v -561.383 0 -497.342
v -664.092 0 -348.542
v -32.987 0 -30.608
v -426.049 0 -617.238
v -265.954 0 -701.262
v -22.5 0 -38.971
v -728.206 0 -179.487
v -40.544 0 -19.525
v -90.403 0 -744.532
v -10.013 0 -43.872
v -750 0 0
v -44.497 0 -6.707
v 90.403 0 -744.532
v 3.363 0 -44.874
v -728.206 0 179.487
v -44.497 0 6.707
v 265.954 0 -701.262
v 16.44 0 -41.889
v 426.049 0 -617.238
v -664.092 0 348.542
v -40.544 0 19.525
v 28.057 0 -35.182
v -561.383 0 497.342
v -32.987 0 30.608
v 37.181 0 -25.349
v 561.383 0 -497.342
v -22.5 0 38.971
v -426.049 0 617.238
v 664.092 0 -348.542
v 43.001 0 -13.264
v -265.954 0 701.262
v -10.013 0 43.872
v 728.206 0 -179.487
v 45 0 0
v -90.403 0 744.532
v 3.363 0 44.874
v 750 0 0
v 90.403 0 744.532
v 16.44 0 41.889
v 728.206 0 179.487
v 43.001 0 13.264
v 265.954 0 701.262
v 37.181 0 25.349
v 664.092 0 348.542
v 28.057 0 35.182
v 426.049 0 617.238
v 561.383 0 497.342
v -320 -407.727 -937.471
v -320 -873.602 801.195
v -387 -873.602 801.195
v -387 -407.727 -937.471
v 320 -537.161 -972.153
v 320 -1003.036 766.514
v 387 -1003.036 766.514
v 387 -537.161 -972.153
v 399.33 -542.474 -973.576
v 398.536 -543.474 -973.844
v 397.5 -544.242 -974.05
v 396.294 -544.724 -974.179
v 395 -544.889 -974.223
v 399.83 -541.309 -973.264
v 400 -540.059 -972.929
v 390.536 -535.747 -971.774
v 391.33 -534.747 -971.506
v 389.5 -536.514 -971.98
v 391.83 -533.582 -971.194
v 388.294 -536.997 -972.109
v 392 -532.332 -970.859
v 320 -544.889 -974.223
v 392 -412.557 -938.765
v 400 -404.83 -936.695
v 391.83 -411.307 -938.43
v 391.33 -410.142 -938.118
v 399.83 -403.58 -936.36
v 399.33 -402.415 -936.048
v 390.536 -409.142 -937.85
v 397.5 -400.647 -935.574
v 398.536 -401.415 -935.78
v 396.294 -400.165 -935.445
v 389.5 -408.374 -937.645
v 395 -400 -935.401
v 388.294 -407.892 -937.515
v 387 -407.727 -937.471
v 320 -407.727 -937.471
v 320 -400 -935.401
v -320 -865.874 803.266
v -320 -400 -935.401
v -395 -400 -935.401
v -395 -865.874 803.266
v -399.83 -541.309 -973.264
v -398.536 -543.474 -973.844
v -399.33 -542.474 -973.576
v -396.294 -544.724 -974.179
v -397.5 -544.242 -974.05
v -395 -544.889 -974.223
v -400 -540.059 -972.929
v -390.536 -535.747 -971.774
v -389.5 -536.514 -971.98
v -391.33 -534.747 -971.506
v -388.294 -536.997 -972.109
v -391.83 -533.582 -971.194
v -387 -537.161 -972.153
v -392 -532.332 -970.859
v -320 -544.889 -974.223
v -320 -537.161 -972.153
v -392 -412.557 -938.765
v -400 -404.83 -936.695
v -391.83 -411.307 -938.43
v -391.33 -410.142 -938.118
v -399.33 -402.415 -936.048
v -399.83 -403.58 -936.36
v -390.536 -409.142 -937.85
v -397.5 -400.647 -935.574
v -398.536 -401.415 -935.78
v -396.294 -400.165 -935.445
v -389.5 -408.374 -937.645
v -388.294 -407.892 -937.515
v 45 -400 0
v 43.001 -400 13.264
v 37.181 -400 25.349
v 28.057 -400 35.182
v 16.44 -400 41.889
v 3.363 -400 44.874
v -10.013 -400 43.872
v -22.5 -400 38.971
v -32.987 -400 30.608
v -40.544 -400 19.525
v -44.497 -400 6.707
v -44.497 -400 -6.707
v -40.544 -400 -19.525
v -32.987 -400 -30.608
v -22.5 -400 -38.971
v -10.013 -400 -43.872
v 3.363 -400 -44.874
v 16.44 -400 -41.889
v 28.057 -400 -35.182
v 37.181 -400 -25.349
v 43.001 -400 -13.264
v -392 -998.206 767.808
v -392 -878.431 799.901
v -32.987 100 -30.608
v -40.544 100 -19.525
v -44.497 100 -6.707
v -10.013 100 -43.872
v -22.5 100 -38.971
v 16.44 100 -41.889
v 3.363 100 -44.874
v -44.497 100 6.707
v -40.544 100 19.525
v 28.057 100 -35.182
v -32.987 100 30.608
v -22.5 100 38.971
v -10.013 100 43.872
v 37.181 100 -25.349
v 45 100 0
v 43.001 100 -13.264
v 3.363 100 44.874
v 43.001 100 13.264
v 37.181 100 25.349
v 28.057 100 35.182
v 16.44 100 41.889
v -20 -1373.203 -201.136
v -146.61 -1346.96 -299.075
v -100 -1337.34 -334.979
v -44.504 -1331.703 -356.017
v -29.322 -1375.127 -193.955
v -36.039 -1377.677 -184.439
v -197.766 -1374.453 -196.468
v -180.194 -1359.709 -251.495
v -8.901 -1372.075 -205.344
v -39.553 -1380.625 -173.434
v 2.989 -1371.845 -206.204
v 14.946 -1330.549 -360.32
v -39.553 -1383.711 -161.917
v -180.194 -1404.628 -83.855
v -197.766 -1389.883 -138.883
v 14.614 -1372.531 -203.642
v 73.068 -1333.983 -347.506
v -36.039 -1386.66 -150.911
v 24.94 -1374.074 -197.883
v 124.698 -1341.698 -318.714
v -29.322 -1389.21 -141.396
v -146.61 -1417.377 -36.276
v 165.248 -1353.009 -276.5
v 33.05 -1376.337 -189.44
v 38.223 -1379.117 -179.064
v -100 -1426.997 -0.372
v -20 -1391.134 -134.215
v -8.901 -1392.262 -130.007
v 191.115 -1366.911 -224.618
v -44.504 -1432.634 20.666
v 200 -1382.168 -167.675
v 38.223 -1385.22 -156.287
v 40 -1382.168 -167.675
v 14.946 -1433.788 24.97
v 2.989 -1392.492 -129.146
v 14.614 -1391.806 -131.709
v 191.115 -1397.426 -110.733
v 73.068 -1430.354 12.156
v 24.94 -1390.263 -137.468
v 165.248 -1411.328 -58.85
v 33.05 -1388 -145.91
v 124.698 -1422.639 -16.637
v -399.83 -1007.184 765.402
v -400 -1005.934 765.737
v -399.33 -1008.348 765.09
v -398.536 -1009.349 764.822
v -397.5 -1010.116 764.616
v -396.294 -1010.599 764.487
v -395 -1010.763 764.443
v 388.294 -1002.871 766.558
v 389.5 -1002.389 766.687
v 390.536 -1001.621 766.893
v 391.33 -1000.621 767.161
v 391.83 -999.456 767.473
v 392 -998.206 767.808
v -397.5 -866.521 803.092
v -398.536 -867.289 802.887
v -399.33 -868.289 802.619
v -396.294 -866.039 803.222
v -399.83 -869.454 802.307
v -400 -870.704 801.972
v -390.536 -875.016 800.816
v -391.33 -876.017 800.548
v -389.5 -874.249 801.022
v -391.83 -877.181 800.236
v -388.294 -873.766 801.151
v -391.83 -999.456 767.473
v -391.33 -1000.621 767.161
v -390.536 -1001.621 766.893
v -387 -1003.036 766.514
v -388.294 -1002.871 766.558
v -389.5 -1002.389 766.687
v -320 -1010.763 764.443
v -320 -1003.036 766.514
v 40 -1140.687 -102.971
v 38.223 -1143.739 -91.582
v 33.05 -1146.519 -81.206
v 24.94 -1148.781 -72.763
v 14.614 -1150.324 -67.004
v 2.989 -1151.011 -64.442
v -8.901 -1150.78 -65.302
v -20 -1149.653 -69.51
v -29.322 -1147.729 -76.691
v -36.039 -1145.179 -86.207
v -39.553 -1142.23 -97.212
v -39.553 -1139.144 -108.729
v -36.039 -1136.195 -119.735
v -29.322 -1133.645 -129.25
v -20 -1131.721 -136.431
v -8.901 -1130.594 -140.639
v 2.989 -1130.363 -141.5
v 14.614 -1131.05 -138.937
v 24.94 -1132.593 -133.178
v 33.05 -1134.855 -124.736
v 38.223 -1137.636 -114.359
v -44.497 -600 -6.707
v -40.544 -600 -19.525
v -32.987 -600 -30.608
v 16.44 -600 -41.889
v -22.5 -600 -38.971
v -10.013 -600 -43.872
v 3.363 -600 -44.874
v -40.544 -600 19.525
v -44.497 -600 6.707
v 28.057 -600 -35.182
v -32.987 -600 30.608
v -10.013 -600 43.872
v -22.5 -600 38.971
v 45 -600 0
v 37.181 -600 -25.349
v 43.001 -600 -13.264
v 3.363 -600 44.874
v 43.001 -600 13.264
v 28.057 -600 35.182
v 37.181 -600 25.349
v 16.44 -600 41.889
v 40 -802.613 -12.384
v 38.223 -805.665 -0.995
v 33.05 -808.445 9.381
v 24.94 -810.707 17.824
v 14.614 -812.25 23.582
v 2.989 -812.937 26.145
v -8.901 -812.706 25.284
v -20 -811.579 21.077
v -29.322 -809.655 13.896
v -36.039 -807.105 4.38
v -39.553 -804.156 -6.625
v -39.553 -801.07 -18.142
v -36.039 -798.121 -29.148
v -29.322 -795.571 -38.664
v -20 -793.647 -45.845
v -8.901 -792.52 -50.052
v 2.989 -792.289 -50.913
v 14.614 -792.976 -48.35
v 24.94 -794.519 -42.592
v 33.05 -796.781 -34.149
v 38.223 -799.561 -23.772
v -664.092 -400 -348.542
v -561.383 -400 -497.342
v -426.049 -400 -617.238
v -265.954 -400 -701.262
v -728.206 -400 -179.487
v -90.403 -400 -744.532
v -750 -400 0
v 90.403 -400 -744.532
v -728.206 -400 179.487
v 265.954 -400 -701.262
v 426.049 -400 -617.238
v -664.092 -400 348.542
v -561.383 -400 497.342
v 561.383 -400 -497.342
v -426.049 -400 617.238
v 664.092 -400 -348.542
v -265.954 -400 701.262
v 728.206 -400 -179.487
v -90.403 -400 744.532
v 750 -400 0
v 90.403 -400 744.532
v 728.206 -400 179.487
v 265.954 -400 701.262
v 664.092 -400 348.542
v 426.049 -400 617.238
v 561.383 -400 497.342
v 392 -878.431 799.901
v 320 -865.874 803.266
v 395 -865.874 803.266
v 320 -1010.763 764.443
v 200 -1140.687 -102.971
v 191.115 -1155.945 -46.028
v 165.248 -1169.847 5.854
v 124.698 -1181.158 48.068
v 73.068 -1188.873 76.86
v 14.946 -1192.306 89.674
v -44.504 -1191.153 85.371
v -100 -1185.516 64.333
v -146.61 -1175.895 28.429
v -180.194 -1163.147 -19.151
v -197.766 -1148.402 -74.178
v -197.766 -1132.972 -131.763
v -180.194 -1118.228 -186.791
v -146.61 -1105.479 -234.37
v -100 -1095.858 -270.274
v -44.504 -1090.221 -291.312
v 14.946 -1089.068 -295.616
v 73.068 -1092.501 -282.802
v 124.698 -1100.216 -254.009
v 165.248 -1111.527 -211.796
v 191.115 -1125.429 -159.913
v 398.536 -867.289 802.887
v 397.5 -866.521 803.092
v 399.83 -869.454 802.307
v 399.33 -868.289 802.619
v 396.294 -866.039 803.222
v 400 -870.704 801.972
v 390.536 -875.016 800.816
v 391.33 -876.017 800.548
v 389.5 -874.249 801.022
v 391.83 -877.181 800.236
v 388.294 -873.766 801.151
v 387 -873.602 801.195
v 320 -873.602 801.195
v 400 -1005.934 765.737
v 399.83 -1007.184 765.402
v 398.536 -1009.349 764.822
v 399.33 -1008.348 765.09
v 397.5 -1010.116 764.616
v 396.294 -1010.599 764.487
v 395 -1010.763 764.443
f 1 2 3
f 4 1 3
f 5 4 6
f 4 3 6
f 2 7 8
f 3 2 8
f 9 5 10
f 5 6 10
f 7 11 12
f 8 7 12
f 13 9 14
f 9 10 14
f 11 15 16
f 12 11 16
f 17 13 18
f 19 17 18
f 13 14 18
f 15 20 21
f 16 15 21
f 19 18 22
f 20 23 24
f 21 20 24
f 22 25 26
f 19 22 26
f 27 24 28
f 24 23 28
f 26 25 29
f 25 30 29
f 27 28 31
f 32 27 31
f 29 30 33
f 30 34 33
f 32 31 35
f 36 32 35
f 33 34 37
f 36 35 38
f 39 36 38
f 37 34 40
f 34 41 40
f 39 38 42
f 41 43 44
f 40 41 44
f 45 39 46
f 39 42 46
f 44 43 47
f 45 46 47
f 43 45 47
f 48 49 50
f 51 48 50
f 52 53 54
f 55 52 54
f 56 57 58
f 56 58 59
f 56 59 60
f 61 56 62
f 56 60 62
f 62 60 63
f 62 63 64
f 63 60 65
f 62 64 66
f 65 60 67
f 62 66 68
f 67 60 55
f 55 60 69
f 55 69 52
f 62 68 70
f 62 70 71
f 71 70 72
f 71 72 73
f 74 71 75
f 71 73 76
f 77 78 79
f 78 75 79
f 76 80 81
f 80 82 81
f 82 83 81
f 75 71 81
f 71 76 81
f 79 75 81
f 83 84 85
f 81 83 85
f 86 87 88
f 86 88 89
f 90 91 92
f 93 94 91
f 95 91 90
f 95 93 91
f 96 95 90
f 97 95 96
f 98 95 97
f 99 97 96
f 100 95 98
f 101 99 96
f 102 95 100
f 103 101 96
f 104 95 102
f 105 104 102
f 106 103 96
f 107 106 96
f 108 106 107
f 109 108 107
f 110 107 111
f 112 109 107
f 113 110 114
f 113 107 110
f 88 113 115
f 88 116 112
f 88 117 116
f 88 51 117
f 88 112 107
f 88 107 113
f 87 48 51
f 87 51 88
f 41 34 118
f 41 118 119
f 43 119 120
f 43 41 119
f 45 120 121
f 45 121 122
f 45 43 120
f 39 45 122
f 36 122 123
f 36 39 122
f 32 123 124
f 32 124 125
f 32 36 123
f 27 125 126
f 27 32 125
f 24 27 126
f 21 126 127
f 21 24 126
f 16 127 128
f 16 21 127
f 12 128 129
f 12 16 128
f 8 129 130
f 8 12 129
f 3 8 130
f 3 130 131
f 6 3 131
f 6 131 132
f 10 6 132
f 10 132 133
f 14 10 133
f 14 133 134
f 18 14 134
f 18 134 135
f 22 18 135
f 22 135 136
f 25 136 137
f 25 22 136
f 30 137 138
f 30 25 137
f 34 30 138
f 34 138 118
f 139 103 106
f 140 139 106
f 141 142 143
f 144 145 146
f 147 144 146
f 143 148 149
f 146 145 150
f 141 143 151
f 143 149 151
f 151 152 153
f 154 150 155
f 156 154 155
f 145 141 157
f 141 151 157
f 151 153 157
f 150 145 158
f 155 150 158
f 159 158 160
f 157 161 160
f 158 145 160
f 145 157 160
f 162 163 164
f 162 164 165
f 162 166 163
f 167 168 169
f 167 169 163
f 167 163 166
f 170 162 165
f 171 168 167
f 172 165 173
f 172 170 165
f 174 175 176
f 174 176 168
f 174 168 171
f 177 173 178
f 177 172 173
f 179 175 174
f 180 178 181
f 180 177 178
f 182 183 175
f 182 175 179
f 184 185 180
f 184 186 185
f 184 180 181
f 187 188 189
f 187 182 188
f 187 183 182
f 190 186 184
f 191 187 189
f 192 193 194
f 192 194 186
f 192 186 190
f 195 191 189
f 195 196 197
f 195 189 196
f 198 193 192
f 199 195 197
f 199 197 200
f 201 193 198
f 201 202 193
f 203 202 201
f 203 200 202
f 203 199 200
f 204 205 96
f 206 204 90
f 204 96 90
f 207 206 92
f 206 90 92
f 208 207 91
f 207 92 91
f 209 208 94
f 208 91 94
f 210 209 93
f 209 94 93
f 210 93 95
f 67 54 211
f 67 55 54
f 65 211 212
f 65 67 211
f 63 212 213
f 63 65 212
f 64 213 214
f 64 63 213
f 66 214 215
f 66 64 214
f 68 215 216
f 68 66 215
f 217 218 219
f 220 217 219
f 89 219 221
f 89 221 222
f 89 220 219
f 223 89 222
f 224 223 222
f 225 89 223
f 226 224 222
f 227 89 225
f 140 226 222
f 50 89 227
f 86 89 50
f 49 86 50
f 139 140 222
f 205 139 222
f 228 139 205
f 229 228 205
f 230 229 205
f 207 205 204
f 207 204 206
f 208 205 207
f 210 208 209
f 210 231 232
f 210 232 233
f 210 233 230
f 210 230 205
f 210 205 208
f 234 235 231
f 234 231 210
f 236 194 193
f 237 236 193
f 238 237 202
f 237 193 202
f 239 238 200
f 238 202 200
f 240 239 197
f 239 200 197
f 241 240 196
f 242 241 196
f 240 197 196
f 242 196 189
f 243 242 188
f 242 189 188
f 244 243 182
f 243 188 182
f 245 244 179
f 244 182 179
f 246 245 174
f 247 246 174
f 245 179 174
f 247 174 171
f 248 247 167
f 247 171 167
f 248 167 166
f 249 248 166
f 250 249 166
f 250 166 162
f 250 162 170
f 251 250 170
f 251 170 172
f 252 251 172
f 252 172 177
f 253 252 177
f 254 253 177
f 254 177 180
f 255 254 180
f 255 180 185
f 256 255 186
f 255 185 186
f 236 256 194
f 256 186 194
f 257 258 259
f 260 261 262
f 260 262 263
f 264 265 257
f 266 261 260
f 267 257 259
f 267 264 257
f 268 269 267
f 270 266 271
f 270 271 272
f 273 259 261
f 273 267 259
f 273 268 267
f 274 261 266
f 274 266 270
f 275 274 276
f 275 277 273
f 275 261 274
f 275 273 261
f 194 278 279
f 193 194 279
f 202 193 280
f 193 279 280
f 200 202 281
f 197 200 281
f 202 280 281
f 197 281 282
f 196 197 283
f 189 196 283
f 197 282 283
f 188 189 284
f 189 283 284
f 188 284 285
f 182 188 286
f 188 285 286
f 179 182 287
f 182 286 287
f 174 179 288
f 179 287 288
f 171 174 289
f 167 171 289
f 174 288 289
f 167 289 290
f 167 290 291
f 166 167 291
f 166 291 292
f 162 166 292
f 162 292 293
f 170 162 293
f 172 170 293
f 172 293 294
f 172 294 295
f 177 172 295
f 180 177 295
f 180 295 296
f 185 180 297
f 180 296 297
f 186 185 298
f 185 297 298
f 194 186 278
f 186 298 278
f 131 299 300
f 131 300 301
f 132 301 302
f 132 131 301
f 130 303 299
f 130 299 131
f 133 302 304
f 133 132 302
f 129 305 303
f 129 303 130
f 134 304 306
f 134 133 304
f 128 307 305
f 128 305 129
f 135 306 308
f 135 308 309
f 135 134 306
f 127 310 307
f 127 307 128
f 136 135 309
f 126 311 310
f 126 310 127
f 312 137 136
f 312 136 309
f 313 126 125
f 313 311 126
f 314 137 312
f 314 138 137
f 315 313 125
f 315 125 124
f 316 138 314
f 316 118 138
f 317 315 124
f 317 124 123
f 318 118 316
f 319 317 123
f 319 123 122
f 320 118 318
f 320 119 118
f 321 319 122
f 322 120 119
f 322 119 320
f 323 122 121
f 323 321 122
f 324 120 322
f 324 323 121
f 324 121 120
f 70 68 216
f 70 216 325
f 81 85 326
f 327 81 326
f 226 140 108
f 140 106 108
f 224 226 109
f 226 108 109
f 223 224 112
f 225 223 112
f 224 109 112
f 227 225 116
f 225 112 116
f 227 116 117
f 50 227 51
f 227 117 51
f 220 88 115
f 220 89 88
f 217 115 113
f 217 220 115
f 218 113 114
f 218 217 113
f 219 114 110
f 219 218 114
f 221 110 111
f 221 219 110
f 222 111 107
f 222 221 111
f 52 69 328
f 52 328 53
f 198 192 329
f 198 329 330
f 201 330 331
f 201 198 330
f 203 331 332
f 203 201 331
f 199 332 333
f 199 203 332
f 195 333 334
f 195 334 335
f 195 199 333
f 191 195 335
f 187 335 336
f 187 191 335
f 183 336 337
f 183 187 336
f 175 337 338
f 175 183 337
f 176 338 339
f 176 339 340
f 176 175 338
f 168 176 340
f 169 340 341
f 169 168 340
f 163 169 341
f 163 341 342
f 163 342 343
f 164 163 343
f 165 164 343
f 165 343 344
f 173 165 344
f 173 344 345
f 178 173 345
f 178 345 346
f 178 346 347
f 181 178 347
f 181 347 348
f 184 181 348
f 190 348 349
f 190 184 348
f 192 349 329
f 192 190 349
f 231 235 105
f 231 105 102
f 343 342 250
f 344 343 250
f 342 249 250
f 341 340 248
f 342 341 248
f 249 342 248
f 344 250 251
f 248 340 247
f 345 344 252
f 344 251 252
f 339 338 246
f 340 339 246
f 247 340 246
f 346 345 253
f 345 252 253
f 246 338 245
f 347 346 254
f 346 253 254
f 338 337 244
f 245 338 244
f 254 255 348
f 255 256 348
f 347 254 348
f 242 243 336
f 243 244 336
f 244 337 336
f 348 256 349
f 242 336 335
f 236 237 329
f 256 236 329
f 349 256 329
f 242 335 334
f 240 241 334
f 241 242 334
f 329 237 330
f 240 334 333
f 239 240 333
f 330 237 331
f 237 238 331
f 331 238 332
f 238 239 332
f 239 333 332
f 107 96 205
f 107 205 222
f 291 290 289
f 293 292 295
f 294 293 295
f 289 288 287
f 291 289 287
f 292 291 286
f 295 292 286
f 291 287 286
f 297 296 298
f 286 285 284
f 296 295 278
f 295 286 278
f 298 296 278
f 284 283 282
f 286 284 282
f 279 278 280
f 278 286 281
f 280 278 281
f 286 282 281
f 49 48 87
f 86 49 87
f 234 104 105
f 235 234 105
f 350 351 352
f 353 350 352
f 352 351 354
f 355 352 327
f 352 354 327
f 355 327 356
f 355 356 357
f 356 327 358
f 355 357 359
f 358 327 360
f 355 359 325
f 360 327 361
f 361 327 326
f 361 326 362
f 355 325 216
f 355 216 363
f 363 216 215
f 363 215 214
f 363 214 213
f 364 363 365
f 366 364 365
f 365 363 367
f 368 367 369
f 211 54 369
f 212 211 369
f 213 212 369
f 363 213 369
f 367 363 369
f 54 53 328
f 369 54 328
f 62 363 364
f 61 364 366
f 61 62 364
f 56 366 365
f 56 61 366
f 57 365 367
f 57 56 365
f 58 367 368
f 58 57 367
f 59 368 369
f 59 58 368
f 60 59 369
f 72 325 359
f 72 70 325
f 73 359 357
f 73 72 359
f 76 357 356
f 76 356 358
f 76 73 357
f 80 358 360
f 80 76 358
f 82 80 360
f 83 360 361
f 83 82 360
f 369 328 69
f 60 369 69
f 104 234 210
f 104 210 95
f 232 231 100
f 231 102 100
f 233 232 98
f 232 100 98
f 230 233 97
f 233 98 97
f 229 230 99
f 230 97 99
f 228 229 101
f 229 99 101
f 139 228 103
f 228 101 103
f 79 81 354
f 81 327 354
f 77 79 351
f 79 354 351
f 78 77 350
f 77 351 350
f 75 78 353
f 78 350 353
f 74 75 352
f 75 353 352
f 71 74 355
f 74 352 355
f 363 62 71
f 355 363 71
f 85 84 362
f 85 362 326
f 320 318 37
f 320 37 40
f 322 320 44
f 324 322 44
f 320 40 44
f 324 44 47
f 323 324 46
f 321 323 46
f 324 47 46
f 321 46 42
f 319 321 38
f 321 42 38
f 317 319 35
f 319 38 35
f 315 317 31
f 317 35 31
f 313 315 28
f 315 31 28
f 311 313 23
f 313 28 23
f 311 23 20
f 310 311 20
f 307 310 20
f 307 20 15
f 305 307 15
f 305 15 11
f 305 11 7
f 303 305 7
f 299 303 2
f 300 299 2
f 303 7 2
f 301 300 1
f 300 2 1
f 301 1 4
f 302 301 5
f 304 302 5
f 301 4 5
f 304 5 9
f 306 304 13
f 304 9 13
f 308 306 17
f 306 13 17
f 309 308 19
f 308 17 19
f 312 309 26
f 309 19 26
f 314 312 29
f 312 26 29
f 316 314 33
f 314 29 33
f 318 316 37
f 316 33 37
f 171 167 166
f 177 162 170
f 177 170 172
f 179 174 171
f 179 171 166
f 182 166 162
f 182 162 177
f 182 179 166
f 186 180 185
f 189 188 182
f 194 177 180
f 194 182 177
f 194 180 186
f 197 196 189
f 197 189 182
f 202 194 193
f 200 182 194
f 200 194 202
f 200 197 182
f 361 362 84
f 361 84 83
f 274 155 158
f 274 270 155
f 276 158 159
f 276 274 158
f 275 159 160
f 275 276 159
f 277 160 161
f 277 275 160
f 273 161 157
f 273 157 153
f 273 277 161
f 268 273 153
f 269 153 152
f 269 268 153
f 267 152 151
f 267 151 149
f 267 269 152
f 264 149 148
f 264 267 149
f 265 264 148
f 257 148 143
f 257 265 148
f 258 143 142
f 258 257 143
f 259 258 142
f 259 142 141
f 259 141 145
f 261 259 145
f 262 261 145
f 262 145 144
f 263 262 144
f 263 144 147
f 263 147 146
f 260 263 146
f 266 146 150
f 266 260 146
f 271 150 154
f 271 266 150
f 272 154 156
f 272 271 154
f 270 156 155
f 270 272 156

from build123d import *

# Parameters (mm, degrees)
F0_R          = 750
F0_R_2        = 45
F1_DEPTH      = 400
F2_DEPTH      = 600
F2_DEPTH_BACK = 100
F4_START      = 320
F4_DEPTH      = 80
F5_W          = 72
F5_H          = 134
F6_DEPTH      = 1966.9105225513
F7_R          = 5
F10_R         = 40
F11_DEPTH     = 600
F12_R         = 200
F12_R_2       = 40
F13_DEPTH     = 250


with BuildPart() as f1:
    # F0 (on Front) → F1 (new body)
    with BuildSketch(Plane.XZ):
        Circle(F0_R)
        Circle(F0_R_2, mode=Mode.SUBTRACT)
    extrude(amount=F1_DEPTH)


with BuildPart() as f2:
    # F0 (on Front) → F2 (new body, two sides)
    with BuildSketch(Plane.XZ) as f2_sk:
        Circle(F0_R_2)
    extrude(amount=F2_DEPTH)
    extrude(f2_sk.sketch, amount=-F2_DEPTH_BACK)


with BuildPart() as f4:
    # F3 (on Right) → F4 (new body)
    with BuildSketch(Plane.YZ.offset(F4_START)):
        Polygon((-544.8888739434, -974.2234780659), (-400, -935.4006213005), (-865.8742811845, 803.2658660198), (-1010.7631551279, 764.4430092544), align=None)
    extrude(amount=F4_DEPTH)

    # F5 (on face) → F6 (cut, through all)
    with BuildSketch(Plane(origin=(0, -258.8190451025, 965.9258262891), x_dir=(1, 0, 0), z_dir=(0, -0.2588190451, 0.9659258263))):
        with Locations((356, -703.4698261089)):
            Rectangle(F5_W, F5_H)
    extrude(amount=-F6_DEPTH, mode=Mode.SUBTRACT)

    # F7
    f7_edges = [f4.edges().sort_by_distance(p)[0] for p in [
        (392, -770.098608, -102.819682),
        (392, -640.664547, -68.13793),
        (400, -777.826015, -104.890234),
        (400, -632.937141, -66.067378),
    ]]
    fillet(f7_edges, radius=F7_R)


with BuildPart() as f8_1:
    # F8: instance of F4
    add(f4.part.mirror(Plane.YZ))


with BuildPart() as f11:
    # F10 (on face) → F11 (new body)
    with BuildSketch(Plane(origin=(0, -751.9441100254, -201.4828170346), x_dir=(1, 0, 0), z_dir=(0, -0.9659258263, -0.2588190451))):
        with Locations((0, 195.7695554011)):
            Circle(F10_R)
    extrude(amount=F11_DEPTH)


with BuildPart() as f13:
    # F12 (on face) → F13 (new body)
    with BuildSketch(Plane(origin=(0, -1331.4996057988, -356.7742440962), x_dir=(1, 0, 0), z_dir=(0, -0.9659258263, -0.2588190451))):
        with Locations((0, 195.7695554011)):
            Circle(F12_R)
        with Locations((0, 195.7695554011)):
            Circle(F12_R_2, mode=Mode.SUBTRACT)
    extrude(amount=-F13_DEPTH)


solid = Compound([f1.part, f2.part, f4.part, f8_1.part, f11.part, f13.part])
